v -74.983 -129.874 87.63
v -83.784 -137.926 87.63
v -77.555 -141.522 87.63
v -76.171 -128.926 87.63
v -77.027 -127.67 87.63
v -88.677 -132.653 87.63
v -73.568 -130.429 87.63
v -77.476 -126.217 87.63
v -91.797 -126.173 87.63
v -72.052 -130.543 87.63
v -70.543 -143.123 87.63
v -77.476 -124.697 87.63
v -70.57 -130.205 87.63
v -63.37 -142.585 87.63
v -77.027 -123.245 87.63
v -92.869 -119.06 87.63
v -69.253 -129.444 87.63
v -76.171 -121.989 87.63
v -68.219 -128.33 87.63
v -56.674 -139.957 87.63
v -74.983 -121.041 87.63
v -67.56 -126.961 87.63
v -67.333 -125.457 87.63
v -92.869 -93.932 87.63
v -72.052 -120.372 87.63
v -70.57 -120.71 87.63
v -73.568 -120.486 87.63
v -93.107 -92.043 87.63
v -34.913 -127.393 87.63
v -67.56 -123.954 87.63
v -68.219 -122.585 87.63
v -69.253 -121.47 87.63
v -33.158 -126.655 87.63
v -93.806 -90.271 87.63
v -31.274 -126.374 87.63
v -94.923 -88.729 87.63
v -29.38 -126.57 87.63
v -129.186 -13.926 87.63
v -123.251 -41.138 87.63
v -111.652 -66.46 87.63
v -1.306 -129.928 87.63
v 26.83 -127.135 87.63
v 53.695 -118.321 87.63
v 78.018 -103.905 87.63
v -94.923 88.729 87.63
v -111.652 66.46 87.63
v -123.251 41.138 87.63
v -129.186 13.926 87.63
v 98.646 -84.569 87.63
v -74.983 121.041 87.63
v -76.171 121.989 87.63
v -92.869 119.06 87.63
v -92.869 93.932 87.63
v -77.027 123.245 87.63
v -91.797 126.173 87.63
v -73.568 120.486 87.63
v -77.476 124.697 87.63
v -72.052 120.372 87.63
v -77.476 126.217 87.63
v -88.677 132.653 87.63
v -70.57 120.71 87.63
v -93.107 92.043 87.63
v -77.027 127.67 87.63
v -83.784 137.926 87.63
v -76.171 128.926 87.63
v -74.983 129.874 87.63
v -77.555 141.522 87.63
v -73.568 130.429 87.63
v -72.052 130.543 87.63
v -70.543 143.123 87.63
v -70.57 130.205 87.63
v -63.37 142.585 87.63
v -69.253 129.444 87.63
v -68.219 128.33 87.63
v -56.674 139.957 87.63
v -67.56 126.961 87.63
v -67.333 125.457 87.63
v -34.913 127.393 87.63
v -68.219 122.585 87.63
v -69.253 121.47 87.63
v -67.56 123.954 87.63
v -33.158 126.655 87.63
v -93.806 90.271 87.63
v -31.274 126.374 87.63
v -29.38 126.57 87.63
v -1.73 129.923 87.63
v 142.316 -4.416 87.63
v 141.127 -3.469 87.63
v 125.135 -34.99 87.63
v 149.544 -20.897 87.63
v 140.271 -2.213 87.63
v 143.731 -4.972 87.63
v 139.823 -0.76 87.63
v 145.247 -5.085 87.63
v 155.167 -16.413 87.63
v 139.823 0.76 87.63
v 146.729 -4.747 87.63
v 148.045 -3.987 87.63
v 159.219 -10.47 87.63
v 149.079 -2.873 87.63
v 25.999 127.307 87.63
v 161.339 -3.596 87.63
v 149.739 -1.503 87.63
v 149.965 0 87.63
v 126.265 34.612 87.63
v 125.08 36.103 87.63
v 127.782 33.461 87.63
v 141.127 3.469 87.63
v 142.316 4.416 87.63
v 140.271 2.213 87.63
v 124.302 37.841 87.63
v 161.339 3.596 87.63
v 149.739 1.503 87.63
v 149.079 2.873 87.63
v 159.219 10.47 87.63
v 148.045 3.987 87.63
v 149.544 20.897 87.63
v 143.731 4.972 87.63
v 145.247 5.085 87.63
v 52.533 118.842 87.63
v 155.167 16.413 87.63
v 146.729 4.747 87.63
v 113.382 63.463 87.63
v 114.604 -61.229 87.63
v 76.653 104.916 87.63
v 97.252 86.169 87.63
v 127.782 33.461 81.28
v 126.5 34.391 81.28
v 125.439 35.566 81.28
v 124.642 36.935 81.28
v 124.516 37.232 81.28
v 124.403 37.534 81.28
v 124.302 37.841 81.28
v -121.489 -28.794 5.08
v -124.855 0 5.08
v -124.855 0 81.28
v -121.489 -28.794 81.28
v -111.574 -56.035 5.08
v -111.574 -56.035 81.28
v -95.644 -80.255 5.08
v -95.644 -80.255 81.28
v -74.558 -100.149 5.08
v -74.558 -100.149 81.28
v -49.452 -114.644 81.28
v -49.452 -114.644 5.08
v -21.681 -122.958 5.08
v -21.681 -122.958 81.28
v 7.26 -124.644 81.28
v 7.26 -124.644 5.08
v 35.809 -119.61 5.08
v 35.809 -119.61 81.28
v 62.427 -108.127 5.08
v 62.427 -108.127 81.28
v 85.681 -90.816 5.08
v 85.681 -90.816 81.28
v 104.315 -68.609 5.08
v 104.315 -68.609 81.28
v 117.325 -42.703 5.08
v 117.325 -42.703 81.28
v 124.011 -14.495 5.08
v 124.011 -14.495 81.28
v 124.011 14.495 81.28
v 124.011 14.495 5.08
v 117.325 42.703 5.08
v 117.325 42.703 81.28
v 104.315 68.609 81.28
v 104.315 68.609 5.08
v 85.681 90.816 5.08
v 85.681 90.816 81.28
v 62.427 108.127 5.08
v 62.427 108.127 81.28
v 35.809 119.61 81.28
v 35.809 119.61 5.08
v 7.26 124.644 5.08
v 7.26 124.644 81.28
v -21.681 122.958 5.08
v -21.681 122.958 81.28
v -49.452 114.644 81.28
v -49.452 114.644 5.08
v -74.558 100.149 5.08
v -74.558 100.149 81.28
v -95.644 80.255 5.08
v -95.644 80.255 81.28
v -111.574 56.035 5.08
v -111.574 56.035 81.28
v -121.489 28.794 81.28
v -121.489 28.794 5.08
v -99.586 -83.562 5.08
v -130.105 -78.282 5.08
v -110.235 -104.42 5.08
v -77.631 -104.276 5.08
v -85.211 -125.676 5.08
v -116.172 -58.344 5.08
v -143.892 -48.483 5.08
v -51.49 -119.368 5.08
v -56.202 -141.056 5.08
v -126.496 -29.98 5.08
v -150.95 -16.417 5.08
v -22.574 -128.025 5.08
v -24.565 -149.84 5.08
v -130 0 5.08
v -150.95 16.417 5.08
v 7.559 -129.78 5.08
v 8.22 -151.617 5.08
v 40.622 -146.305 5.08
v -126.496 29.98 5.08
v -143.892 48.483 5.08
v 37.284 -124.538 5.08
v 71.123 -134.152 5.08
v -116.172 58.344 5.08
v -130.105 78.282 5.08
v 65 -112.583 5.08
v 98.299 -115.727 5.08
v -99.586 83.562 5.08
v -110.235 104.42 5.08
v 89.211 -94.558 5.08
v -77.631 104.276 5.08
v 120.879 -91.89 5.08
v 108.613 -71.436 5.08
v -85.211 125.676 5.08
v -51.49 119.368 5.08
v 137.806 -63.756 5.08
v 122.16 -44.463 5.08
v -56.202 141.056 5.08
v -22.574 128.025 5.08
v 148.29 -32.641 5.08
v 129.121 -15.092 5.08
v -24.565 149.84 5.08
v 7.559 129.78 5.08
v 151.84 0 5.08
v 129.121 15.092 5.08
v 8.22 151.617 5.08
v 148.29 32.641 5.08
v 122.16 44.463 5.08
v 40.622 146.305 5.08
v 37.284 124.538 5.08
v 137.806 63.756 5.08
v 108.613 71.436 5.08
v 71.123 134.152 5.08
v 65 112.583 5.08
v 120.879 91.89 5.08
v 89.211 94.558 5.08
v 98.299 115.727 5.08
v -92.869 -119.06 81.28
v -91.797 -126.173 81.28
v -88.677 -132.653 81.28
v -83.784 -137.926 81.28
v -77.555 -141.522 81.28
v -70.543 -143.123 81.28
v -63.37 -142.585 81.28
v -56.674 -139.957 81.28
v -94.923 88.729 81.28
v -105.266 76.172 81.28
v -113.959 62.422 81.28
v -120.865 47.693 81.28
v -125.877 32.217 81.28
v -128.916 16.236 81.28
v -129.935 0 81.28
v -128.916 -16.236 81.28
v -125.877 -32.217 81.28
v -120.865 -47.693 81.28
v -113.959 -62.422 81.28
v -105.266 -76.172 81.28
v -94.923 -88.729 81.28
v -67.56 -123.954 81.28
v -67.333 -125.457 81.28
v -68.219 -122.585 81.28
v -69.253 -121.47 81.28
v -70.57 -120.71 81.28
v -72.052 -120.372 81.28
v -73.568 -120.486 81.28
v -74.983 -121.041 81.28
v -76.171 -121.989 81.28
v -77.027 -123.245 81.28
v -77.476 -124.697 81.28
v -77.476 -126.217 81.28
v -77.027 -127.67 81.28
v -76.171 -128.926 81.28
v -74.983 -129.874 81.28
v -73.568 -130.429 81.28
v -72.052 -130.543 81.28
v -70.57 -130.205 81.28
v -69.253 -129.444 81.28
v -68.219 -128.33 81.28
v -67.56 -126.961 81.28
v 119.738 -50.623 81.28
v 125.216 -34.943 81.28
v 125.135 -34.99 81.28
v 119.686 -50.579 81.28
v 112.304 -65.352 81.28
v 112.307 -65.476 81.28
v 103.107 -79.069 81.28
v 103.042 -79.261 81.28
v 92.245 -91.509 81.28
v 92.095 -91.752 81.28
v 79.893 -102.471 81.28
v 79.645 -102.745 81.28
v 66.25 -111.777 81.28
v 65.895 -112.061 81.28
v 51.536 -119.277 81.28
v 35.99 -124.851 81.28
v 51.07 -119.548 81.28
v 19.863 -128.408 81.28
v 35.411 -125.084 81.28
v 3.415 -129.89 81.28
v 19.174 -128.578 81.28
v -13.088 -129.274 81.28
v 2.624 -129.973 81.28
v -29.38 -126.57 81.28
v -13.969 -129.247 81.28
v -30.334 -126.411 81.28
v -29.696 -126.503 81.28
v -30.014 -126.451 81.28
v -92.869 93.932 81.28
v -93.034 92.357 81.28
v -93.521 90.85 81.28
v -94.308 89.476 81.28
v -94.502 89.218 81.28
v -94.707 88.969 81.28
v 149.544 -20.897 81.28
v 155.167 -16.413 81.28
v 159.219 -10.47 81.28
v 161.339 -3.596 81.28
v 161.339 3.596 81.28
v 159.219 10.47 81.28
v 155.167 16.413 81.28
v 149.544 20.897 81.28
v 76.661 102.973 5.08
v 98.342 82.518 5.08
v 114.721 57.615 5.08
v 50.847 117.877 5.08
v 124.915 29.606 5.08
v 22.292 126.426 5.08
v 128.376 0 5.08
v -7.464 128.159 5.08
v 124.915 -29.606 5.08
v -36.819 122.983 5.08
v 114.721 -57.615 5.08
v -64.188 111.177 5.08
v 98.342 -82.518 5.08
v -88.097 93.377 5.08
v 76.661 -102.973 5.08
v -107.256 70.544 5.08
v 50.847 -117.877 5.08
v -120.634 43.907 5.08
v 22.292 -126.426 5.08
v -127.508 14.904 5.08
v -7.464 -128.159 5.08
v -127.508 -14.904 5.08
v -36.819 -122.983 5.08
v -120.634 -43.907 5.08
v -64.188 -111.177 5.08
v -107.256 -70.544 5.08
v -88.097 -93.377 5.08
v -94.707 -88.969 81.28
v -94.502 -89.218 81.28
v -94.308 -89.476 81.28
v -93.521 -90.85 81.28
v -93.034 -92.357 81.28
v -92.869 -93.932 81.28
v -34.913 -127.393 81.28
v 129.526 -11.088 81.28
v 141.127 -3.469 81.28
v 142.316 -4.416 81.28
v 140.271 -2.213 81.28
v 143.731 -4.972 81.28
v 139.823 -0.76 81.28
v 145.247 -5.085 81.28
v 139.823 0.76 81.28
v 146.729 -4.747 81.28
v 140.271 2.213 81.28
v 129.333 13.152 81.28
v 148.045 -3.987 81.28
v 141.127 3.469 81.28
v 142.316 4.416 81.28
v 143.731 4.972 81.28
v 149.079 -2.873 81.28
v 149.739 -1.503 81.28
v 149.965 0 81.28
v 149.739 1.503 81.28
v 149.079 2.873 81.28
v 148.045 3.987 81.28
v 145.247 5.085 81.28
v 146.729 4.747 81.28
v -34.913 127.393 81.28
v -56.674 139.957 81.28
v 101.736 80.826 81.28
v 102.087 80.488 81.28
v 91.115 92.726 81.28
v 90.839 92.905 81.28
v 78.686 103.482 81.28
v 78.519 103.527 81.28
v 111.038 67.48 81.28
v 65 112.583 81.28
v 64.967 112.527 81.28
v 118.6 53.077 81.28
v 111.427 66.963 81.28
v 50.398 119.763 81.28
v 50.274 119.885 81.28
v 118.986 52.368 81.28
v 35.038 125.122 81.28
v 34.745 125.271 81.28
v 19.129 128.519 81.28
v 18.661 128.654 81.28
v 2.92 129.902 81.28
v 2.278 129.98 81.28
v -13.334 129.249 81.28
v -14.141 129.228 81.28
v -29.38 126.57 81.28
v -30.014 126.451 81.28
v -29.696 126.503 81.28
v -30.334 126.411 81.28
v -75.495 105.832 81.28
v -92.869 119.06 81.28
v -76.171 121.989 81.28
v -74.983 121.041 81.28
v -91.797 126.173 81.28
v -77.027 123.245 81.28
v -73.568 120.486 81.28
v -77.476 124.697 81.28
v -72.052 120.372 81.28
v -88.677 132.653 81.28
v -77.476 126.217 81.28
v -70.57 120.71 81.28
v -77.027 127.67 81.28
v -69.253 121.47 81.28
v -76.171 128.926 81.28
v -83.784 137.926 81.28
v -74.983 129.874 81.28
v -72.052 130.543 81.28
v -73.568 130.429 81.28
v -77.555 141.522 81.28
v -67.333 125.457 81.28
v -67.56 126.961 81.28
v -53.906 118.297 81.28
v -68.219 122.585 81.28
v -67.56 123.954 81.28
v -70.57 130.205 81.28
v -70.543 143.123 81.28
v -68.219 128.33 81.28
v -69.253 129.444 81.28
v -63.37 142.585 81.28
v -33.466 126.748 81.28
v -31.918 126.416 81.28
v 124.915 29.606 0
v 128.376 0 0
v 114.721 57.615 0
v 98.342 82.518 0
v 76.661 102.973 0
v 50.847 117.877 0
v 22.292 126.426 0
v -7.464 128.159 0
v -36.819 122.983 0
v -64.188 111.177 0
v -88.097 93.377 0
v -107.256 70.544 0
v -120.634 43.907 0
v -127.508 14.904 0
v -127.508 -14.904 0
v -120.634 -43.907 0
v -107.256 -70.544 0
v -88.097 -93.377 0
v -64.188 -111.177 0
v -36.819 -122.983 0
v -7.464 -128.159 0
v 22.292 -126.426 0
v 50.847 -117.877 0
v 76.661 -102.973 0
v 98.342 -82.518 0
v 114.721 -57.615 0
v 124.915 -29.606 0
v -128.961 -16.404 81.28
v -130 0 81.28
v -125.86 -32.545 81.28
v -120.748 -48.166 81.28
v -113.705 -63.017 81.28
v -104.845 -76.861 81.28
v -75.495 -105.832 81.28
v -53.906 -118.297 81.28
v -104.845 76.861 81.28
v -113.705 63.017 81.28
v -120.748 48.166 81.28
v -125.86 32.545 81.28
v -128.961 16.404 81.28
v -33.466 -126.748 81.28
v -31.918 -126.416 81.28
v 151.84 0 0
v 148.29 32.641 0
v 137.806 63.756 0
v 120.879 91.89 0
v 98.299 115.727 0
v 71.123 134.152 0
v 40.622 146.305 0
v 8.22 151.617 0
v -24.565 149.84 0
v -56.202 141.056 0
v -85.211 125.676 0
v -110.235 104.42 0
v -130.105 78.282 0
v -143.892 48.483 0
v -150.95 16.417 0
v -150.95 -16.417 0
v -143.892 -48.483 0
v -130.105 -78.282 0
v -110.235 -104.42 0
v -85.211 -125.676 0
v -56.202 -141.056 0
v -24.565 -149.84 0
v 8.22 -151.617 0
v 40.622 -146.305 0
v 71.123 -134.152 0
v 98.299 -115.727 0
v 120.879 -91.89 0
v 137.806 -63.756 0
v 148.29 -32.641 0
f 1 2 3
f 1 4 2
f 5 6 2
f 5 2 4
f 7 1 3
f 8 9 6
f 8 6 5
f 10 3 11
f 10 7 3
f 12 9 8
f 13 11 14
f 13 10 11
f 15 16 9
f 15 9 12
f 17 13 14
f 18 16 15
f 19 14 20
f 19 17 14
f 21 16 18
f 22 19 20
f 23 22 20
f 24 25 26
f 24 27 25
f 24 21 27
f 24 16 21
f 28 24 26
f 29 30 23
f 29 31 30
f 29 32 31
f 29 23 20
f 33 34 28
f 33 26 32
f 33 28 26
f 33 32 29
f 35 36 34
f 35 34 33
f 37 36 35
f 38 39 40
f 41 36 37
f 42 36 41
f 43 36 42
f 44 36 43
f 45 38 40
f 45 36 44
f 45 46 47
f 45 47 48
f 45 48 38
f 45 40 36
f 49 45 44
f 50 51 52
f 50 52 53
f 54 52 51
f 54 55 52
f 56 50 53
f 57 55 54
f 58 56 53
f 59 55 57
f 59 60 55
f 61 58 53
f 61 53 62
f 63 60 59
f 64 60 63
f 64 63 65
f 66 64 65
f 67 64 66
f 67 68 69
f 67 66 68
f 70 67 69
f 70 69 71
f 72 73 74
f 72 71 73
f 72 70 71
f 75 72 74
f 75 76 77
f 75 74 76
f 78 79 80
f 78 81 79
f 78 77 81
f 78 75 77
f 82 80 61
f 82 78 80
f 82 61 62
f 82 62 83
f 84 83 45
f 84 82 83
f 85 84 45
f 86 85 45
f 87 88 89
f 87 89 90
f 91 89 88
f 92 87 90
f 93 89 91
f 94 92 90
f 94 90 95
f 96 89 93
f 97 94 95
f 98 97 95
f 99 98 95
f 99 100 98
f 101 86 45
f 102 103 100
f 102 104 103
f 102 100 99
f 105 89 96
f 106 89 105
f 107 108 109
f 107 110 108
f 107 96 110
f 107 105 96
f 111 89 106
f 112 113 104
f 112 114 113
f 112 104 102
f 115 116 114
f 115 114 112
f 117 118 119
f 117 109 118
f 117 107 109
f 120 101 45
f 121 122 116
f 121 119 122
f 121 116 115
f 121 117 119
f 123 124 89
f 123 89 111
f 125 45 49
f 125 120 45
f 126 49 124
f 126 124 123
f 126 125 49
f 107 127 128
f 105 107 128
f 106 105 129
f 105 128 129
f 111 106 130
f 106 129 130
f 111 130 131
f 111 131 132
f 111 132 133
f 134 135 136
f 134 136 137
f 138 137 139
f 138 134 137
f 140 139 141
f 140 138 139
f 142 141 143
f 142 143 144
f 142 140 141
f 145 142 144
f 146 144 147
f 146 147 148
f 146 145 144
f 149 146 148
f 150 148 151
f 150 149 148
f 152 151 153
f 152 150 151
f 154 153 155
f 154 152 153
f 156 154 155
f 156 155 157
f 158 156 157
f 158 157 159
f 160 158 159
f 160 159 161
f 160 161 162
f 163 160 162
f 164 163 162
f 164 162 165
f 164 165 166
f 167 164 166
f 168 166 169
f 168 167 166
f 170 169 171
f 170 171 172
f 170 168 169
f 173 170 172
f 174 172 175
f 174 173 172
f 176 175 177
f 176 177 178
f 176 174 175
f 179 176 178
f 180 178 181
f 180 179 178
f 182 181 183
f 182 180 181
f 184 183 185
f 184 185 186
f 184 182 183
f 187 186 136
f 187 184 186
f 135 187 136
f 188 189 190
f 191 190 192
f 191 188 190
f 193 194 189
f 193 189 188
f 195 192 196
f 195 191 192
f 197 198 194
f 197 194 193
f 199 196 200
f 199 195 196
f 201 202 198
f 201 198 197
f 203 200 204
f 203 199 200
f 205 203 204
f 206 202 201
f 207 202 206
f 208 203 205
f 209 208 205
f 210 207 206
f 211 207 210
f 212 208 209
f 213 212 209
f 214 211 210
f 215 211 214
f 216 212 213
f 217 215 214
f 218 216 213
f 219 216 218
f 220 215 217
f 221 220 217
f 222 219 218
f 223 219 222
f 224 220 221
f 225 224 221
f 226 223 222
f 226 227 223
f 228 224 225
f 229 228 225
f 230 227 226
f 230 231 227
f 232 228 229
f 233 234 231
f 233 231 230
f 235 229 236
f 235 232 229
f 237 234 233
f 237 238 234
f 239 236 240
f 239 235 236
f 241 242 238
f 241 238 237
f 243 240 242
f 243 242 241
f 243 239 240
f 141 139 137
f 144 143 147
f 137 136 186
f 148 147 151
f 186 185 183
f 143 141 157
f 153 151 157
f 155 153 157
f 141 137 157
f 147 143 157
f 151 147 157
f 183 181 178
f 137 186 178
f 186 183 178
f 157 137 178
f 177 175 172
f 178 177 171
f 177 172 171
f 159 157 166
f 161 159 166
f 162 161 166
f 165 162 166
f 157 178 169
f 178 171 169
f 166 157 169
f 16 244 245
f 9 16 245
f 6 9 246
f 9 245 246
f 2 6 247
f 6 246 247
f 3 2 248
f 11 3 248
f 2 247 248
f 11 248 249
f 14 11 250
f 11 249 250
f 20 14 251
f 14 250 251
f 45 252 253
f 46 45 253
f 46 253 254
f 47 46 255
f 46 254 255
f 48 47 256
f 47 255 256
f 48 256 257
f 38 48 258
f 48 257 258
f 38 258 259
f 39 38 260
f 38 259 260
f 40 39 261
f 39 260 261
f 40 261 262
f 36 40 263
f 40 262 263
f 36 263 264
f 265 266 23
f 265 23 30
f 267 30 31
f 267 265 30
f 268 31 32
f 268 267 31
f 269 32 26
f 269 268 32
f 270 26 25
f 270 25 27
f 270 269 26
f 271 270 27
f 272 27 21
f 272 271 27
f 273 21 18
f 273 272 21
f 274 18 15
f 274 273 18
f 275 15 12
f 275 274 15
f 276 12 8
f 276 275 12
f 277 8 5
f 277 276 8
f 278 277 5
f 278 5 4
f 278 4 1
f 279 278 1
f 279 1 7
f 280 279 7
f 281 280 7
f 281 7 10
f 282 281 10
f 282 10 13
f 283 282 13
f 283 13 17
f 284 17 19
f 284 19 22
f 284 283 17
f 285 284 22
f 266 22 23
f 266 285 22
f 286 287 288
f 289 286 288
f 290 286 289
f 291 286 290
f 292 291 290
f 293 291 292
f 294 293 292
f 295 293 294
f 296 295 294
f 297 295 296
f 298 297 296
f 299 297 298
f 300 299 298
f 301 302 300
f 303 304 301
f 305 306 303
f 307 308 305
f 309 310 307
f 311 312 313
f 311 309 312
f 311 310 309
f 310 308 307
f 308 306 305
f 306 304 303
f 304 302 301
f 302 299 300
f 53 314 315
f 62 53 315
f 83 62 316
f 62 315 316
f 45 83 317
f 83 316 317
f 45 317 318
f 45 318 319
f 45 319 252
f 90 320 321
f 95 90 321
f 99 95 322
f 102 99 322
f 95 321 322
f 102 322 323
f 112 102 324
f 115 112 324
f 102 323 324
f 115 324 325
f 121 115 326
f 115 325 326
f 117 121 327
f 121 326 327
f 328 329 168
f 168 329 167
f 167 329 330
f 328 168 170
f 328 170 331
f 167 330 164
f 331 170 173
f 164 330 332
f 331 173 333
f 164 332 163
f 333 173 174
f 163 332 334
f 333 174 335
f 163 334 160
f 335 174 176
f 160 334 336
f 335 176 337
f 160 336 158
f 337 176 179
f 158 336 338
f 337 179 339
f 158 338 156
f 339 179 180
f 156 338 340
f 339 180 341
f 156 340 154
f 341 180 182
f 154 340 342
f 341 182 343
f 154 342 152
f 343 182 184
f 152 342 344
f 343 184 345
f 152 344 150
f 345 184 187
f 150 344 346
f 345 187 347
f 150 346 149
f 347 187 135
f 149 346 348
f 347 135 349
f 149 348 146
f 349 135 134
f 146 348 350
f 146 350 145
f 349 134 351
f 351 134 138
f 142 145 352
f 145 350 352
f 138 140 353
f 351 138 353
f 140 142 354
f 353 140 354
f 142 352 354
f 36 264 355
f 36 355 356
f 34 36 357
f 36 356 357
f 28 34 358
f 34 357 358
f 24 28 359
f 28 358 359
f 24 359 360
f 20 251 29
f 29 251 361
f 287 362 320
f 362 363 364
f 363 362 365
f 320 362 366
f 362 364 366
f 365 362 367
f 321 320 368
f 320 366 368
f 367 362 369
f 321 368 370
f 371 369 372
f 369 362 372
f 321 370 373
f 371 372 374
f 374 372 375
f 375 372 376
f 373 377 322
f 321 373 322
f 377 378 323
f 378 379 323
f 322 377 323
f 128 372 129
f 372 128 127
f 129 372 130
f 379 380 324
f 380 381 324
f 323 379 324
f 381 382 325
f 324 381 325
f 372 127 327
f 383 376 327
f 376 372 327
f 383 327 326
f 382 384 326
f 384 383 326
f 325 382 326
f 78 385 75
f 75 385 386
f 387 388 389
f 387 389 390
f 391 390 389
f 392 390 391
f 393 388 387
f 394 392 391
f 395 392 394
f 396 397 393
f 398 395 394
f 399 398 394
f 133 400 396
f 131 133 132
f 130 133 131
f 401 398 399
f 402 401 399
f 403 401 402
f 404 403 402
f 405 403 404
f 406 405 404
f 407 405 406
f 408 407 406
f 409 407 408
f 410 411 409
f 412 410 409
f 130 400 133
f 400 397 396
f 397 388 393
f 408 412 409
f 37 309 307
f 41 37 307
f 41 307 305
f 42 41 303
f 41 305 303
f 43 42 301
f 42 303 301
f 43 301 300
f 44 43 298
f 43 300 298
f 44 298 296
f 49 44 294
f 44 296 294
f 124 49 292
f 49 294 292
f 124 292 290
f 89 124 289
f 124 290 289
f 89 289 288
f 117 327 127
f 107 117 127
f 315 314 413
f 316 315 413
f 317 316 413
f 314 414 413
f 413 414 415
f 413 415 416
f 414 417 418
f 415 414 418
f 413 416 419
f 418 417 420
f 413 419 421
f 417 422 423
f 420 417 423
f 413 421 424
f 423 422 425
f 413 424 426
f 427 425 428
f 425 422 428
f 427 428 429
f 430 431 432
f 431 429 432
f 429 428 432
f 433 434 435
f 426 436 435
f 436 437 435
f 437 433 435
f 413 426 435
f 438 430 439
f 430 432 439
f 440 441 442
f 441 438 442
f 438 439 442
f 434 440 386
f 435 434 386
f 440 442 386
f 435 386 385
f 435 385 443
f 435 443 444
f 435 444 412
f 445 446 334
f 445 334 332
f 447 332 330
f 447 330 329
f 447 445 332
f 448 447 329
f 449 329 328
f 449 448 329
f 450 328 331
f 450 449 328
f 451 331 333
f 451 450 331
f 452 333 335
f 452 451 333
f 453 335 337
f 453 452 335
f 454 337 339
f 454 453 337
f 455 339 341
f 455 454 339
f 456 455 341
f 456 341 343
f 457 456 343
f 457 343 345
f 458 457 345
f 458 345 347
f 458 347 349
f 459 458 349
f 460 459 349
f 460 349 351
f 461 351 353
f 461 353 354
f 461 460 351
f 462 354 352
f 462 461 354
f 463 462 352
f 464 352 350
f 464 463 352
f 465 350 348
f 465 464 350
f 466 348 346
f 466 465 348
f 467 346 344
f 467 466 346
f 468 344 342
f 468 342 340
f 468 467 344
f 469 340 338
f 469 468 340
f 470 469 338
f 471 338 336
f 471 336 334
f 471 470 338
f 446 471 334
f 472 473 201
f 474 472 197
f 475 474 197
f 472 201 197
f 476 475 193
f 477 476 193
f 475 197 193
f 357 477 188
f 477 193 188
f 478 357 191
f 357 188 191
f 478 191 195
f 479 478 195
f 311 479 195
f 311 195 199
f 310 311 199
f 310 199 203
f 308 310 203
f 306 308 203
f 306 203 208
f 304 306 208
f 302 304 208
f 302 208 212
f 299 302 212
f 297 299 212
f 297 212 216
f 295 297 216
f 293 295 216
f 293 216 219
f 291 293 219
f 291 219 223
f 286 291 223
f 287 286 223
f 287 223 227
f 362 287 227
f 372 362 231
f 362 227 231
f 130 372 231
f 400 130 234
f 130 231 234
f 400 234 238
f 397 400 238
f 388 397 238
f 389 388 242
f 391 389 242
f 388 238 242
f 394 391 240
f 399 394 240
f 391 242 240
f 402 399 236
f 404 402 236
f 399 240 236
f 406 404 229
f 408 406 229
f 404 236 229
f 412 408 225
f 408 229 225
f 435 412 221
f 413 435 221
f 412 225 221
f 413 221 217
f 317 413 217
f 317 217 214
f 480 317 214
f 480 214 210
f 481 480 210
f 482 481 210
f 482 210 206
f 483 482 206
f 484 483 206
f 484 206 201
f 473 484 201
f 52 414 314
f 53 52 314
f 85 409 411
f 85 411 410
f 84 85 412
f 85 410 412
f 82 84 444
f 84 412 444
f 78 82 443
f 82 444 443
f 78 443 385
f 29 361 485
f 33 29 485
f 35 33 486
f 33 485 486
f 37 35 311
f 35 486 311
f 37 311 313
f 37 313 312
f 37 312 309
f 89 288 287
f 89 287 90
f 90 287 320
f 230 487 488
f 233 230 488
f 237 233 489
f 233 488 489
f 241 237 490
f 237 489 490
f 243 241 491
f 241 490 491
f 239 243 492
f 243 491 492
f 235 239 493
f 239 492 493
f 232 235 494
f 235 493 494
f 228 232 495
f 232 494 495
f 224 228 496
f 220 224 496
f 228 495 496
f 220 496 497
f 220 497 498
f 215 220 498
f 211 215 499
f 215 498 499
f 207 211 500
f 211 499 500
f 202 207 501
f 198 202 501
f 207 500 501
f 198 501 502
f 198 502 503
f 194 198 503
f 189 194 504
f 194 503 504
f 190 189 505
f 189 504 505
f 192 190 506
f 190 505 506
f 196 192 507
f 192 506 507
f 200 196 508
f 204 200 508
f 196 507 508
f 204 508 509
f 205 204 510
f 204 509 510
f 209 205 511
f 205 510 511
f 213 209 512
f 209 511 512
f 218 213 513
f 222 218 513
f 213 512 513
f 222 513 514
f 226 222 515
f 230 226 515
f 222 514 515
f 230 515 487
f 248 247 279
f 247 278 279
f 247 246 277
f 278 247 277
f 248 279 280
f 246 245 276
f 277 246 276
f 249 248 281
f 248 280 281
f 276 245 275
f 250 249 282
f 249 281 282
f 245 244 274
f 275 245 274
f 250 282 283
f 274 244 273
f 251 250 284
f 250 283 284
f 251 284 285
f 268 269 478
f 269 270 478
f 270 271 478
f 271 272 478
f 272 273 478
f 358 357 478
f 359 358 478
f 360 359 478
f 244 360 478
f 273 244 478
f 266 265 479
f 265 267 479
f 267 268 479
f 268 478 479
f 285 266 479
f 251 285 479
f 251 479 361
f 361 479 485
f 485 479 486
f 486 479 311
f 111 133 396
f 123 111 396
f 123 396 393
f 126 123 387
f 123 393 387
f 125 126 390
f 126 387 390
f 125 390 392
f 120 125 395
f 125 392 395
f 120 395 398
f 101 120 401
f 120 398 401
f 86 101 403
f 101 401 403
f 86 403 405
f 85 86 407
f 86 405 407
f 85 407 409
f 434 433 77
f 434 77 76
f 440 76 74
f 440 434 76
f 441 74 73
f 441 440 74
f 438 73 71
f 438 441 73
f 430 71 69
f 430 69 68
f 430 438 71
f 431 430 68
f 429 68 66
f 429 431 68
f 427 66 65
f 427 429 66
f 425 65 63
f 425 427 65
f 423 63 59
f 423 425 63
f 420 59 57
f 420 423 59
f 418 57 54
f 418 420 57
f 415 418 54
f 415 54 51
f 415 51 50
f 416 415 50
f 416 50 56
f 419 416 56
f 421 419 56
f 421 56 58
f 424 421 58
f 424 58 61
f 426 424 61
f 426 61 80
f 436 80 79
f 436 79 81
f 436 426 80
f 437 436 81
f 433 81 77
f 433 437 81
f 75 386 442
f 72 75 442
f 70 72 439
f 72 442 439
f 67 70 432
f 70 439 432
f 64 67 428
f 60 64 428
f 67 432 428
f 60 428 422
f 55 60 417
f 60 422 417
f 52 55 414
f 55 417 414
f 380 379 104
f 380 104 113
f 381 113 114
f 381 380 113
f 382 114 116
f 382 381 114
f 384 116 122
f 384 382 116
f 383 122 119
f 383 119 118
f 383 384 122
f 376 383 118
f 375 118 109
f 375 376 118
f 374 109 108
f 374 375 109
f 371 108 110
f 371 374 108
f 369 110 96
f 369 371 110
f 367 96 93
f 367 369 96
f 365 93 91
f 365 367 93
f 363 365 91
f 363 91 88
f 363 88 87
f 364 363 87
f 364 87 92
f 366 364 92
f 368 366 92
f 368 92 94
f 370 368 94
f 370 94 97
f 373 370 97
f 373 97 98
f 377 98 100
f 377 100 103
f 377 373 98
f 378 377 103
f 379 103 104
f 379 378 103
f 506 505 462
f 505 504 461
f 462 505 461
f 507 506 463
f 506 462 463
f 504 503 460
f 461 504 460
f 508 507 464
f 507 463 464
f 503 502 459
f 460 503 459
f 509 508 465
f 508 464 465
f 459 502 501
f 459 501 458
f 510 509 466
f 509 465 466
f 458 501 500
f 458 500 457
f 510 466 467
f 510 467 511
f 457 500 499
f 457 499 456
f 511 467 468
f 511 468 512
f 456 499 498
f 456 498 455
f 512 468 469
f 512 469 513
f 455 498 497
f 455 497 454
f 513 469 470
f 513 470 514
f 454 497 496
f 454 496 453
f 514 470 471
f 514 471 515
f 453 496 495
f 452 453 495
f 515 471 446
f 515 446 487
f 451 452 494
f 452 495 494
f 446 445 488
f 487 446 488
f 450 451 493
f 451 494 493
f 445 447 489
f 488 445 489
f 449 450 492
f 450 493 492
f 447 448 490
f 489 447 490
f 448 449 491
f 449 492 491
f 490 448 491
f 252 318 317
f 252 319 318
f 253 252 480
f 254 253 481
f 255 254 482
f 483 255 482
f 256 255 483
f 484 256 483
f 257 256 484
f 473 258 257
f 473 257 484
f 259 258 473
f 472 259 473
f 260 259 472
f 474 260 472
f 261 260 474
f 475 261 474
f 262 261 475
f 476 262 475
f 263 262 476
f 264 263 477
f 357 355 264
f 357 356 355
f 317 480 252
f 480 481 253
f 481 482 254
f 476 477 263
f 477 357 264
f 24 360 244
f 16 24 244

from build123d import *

# Parameters (mm, degrees)
SKETCH4_R      = 151.840016695
SKETCH4_R_2    = 128.375867971
EXTRUDE1_DEPTH = 5.08
SKETCH6_R      = 129.999844579
SKETCH6_R_2    = 124.85482448
EXTRUDE2_DEPTH = 76.2
SKETCH8_R      = 5.099609744
EXTRUDE3_DEPTH = 6.35


with BuildPart() as part:
    # Sketch4 → Extrude1 (new body)
    with BuildSketch(Plane.XY):
        Circle(SKETCH4_R)
        Circle(SKETCH4_R_2, mode=Mode.SUBTRACT)
    extrude(amount=EXTRUDE1_DEPTH)

    # Sketch6 → Extrude2 (add)
    with BuildSketch(Plane.XY.offset(5.08)):
        with Locations(Location((0, 0, 0), (0, 0, 180))):
            Circle(SKETCH6_R)
        with Locations(Location((0, 0, 0), (0, 0, 180))):
            Circle(SKETCH6_R_2, mode=Mode.SUBTRACT)
    extrude(amount=EXTRUDE2_DEPTH)

    # Sketch8 → Extrude3 (add)
    with BuildSketch(Plane.XY.offset(81.28)):
        with BuildLine():
            Line((-92.869363805, -93.93198337), (-92.869363805, -119.06007059))
            ThreePointArc((-92.869363805, -119.06007059), (-80.804363805, -139.957263584), (-56.674363805, -139.957263584))
            Line((-56.674363805, -139.957263584), (-34.912801923, -127.393219973))
            ThreePointArc((-34.912801923, -127.393219973), (-32.224618976, -126.455362905), (-29.379828181, -126.569681633))
            ThreePointArc((-29.379828181, -126.569681633), (66.249521237, -111.776829211), (125.135094286, -34.989524014))
            Line((125.135094286, -34.989524014), (149.54372761, -20.897192993))
            ThreePointArc((149.54372761, -20.897192993), (161.60872761, 0), (149.54372761, 20.897192993))
            Line((149.54372761, 20.897192993), (127.782165728, 33.461236604))
            ThreePointArc((127.782165728, 33.461236604), (125.625866209, 35.320342792), (124.302473734, 37.841163253))
            ThreePointArc((124.302473734, 37.841163253), (64.96741224, 112.526858836), (-29.379828181, 126.569681633))
            ThreePointArc((-29.379828181, 126.569681633), (-32.224618976, 126.455362905), (-34.912801923, 127.393219973))
            Line((-34.912801923, 127.393219973), (-56.674363805, 139.957263584))
            ThreePointArc((-56.674363805, 139.957263584), (-80.804363805, 139.957263584), (-92.869363805, 119.06007059))
            Line((-92.869363805, 119.06007059), (-92.869363805, 93.93198337))
            ThreePointArc((-92.869363805, 93.93198337), (-93.401247233, 91.135020113), (-94.922645552, 88.72851838))
            ThreePointArc((-94.922645552, 88.72851838), (-129.93482448, 0), (-94.922645552, -88.72851838))
            ThreePointArc((-94.922645552, -88.72851838), (-93.401247233, -91.135020113), (-92.869363805, -93.93198337))
        make_face()
        with Locations((-72.432875103, 125.457419816)):
            Circle(SKETCH8_R, mode=Mode.SUBTRACT)
        with Locations((144.865750205, 0)):
            Circle(SKETCH8_R, mode=Mode.SUBTRACT)
        with Locations((-72.432875103, -125.457419816)):
            Circle(SKETCH8_R, mode=Mode.SUBTRACT)
    extrude(amount=EXTRUDE3_DEPTH)


solid = part.part
